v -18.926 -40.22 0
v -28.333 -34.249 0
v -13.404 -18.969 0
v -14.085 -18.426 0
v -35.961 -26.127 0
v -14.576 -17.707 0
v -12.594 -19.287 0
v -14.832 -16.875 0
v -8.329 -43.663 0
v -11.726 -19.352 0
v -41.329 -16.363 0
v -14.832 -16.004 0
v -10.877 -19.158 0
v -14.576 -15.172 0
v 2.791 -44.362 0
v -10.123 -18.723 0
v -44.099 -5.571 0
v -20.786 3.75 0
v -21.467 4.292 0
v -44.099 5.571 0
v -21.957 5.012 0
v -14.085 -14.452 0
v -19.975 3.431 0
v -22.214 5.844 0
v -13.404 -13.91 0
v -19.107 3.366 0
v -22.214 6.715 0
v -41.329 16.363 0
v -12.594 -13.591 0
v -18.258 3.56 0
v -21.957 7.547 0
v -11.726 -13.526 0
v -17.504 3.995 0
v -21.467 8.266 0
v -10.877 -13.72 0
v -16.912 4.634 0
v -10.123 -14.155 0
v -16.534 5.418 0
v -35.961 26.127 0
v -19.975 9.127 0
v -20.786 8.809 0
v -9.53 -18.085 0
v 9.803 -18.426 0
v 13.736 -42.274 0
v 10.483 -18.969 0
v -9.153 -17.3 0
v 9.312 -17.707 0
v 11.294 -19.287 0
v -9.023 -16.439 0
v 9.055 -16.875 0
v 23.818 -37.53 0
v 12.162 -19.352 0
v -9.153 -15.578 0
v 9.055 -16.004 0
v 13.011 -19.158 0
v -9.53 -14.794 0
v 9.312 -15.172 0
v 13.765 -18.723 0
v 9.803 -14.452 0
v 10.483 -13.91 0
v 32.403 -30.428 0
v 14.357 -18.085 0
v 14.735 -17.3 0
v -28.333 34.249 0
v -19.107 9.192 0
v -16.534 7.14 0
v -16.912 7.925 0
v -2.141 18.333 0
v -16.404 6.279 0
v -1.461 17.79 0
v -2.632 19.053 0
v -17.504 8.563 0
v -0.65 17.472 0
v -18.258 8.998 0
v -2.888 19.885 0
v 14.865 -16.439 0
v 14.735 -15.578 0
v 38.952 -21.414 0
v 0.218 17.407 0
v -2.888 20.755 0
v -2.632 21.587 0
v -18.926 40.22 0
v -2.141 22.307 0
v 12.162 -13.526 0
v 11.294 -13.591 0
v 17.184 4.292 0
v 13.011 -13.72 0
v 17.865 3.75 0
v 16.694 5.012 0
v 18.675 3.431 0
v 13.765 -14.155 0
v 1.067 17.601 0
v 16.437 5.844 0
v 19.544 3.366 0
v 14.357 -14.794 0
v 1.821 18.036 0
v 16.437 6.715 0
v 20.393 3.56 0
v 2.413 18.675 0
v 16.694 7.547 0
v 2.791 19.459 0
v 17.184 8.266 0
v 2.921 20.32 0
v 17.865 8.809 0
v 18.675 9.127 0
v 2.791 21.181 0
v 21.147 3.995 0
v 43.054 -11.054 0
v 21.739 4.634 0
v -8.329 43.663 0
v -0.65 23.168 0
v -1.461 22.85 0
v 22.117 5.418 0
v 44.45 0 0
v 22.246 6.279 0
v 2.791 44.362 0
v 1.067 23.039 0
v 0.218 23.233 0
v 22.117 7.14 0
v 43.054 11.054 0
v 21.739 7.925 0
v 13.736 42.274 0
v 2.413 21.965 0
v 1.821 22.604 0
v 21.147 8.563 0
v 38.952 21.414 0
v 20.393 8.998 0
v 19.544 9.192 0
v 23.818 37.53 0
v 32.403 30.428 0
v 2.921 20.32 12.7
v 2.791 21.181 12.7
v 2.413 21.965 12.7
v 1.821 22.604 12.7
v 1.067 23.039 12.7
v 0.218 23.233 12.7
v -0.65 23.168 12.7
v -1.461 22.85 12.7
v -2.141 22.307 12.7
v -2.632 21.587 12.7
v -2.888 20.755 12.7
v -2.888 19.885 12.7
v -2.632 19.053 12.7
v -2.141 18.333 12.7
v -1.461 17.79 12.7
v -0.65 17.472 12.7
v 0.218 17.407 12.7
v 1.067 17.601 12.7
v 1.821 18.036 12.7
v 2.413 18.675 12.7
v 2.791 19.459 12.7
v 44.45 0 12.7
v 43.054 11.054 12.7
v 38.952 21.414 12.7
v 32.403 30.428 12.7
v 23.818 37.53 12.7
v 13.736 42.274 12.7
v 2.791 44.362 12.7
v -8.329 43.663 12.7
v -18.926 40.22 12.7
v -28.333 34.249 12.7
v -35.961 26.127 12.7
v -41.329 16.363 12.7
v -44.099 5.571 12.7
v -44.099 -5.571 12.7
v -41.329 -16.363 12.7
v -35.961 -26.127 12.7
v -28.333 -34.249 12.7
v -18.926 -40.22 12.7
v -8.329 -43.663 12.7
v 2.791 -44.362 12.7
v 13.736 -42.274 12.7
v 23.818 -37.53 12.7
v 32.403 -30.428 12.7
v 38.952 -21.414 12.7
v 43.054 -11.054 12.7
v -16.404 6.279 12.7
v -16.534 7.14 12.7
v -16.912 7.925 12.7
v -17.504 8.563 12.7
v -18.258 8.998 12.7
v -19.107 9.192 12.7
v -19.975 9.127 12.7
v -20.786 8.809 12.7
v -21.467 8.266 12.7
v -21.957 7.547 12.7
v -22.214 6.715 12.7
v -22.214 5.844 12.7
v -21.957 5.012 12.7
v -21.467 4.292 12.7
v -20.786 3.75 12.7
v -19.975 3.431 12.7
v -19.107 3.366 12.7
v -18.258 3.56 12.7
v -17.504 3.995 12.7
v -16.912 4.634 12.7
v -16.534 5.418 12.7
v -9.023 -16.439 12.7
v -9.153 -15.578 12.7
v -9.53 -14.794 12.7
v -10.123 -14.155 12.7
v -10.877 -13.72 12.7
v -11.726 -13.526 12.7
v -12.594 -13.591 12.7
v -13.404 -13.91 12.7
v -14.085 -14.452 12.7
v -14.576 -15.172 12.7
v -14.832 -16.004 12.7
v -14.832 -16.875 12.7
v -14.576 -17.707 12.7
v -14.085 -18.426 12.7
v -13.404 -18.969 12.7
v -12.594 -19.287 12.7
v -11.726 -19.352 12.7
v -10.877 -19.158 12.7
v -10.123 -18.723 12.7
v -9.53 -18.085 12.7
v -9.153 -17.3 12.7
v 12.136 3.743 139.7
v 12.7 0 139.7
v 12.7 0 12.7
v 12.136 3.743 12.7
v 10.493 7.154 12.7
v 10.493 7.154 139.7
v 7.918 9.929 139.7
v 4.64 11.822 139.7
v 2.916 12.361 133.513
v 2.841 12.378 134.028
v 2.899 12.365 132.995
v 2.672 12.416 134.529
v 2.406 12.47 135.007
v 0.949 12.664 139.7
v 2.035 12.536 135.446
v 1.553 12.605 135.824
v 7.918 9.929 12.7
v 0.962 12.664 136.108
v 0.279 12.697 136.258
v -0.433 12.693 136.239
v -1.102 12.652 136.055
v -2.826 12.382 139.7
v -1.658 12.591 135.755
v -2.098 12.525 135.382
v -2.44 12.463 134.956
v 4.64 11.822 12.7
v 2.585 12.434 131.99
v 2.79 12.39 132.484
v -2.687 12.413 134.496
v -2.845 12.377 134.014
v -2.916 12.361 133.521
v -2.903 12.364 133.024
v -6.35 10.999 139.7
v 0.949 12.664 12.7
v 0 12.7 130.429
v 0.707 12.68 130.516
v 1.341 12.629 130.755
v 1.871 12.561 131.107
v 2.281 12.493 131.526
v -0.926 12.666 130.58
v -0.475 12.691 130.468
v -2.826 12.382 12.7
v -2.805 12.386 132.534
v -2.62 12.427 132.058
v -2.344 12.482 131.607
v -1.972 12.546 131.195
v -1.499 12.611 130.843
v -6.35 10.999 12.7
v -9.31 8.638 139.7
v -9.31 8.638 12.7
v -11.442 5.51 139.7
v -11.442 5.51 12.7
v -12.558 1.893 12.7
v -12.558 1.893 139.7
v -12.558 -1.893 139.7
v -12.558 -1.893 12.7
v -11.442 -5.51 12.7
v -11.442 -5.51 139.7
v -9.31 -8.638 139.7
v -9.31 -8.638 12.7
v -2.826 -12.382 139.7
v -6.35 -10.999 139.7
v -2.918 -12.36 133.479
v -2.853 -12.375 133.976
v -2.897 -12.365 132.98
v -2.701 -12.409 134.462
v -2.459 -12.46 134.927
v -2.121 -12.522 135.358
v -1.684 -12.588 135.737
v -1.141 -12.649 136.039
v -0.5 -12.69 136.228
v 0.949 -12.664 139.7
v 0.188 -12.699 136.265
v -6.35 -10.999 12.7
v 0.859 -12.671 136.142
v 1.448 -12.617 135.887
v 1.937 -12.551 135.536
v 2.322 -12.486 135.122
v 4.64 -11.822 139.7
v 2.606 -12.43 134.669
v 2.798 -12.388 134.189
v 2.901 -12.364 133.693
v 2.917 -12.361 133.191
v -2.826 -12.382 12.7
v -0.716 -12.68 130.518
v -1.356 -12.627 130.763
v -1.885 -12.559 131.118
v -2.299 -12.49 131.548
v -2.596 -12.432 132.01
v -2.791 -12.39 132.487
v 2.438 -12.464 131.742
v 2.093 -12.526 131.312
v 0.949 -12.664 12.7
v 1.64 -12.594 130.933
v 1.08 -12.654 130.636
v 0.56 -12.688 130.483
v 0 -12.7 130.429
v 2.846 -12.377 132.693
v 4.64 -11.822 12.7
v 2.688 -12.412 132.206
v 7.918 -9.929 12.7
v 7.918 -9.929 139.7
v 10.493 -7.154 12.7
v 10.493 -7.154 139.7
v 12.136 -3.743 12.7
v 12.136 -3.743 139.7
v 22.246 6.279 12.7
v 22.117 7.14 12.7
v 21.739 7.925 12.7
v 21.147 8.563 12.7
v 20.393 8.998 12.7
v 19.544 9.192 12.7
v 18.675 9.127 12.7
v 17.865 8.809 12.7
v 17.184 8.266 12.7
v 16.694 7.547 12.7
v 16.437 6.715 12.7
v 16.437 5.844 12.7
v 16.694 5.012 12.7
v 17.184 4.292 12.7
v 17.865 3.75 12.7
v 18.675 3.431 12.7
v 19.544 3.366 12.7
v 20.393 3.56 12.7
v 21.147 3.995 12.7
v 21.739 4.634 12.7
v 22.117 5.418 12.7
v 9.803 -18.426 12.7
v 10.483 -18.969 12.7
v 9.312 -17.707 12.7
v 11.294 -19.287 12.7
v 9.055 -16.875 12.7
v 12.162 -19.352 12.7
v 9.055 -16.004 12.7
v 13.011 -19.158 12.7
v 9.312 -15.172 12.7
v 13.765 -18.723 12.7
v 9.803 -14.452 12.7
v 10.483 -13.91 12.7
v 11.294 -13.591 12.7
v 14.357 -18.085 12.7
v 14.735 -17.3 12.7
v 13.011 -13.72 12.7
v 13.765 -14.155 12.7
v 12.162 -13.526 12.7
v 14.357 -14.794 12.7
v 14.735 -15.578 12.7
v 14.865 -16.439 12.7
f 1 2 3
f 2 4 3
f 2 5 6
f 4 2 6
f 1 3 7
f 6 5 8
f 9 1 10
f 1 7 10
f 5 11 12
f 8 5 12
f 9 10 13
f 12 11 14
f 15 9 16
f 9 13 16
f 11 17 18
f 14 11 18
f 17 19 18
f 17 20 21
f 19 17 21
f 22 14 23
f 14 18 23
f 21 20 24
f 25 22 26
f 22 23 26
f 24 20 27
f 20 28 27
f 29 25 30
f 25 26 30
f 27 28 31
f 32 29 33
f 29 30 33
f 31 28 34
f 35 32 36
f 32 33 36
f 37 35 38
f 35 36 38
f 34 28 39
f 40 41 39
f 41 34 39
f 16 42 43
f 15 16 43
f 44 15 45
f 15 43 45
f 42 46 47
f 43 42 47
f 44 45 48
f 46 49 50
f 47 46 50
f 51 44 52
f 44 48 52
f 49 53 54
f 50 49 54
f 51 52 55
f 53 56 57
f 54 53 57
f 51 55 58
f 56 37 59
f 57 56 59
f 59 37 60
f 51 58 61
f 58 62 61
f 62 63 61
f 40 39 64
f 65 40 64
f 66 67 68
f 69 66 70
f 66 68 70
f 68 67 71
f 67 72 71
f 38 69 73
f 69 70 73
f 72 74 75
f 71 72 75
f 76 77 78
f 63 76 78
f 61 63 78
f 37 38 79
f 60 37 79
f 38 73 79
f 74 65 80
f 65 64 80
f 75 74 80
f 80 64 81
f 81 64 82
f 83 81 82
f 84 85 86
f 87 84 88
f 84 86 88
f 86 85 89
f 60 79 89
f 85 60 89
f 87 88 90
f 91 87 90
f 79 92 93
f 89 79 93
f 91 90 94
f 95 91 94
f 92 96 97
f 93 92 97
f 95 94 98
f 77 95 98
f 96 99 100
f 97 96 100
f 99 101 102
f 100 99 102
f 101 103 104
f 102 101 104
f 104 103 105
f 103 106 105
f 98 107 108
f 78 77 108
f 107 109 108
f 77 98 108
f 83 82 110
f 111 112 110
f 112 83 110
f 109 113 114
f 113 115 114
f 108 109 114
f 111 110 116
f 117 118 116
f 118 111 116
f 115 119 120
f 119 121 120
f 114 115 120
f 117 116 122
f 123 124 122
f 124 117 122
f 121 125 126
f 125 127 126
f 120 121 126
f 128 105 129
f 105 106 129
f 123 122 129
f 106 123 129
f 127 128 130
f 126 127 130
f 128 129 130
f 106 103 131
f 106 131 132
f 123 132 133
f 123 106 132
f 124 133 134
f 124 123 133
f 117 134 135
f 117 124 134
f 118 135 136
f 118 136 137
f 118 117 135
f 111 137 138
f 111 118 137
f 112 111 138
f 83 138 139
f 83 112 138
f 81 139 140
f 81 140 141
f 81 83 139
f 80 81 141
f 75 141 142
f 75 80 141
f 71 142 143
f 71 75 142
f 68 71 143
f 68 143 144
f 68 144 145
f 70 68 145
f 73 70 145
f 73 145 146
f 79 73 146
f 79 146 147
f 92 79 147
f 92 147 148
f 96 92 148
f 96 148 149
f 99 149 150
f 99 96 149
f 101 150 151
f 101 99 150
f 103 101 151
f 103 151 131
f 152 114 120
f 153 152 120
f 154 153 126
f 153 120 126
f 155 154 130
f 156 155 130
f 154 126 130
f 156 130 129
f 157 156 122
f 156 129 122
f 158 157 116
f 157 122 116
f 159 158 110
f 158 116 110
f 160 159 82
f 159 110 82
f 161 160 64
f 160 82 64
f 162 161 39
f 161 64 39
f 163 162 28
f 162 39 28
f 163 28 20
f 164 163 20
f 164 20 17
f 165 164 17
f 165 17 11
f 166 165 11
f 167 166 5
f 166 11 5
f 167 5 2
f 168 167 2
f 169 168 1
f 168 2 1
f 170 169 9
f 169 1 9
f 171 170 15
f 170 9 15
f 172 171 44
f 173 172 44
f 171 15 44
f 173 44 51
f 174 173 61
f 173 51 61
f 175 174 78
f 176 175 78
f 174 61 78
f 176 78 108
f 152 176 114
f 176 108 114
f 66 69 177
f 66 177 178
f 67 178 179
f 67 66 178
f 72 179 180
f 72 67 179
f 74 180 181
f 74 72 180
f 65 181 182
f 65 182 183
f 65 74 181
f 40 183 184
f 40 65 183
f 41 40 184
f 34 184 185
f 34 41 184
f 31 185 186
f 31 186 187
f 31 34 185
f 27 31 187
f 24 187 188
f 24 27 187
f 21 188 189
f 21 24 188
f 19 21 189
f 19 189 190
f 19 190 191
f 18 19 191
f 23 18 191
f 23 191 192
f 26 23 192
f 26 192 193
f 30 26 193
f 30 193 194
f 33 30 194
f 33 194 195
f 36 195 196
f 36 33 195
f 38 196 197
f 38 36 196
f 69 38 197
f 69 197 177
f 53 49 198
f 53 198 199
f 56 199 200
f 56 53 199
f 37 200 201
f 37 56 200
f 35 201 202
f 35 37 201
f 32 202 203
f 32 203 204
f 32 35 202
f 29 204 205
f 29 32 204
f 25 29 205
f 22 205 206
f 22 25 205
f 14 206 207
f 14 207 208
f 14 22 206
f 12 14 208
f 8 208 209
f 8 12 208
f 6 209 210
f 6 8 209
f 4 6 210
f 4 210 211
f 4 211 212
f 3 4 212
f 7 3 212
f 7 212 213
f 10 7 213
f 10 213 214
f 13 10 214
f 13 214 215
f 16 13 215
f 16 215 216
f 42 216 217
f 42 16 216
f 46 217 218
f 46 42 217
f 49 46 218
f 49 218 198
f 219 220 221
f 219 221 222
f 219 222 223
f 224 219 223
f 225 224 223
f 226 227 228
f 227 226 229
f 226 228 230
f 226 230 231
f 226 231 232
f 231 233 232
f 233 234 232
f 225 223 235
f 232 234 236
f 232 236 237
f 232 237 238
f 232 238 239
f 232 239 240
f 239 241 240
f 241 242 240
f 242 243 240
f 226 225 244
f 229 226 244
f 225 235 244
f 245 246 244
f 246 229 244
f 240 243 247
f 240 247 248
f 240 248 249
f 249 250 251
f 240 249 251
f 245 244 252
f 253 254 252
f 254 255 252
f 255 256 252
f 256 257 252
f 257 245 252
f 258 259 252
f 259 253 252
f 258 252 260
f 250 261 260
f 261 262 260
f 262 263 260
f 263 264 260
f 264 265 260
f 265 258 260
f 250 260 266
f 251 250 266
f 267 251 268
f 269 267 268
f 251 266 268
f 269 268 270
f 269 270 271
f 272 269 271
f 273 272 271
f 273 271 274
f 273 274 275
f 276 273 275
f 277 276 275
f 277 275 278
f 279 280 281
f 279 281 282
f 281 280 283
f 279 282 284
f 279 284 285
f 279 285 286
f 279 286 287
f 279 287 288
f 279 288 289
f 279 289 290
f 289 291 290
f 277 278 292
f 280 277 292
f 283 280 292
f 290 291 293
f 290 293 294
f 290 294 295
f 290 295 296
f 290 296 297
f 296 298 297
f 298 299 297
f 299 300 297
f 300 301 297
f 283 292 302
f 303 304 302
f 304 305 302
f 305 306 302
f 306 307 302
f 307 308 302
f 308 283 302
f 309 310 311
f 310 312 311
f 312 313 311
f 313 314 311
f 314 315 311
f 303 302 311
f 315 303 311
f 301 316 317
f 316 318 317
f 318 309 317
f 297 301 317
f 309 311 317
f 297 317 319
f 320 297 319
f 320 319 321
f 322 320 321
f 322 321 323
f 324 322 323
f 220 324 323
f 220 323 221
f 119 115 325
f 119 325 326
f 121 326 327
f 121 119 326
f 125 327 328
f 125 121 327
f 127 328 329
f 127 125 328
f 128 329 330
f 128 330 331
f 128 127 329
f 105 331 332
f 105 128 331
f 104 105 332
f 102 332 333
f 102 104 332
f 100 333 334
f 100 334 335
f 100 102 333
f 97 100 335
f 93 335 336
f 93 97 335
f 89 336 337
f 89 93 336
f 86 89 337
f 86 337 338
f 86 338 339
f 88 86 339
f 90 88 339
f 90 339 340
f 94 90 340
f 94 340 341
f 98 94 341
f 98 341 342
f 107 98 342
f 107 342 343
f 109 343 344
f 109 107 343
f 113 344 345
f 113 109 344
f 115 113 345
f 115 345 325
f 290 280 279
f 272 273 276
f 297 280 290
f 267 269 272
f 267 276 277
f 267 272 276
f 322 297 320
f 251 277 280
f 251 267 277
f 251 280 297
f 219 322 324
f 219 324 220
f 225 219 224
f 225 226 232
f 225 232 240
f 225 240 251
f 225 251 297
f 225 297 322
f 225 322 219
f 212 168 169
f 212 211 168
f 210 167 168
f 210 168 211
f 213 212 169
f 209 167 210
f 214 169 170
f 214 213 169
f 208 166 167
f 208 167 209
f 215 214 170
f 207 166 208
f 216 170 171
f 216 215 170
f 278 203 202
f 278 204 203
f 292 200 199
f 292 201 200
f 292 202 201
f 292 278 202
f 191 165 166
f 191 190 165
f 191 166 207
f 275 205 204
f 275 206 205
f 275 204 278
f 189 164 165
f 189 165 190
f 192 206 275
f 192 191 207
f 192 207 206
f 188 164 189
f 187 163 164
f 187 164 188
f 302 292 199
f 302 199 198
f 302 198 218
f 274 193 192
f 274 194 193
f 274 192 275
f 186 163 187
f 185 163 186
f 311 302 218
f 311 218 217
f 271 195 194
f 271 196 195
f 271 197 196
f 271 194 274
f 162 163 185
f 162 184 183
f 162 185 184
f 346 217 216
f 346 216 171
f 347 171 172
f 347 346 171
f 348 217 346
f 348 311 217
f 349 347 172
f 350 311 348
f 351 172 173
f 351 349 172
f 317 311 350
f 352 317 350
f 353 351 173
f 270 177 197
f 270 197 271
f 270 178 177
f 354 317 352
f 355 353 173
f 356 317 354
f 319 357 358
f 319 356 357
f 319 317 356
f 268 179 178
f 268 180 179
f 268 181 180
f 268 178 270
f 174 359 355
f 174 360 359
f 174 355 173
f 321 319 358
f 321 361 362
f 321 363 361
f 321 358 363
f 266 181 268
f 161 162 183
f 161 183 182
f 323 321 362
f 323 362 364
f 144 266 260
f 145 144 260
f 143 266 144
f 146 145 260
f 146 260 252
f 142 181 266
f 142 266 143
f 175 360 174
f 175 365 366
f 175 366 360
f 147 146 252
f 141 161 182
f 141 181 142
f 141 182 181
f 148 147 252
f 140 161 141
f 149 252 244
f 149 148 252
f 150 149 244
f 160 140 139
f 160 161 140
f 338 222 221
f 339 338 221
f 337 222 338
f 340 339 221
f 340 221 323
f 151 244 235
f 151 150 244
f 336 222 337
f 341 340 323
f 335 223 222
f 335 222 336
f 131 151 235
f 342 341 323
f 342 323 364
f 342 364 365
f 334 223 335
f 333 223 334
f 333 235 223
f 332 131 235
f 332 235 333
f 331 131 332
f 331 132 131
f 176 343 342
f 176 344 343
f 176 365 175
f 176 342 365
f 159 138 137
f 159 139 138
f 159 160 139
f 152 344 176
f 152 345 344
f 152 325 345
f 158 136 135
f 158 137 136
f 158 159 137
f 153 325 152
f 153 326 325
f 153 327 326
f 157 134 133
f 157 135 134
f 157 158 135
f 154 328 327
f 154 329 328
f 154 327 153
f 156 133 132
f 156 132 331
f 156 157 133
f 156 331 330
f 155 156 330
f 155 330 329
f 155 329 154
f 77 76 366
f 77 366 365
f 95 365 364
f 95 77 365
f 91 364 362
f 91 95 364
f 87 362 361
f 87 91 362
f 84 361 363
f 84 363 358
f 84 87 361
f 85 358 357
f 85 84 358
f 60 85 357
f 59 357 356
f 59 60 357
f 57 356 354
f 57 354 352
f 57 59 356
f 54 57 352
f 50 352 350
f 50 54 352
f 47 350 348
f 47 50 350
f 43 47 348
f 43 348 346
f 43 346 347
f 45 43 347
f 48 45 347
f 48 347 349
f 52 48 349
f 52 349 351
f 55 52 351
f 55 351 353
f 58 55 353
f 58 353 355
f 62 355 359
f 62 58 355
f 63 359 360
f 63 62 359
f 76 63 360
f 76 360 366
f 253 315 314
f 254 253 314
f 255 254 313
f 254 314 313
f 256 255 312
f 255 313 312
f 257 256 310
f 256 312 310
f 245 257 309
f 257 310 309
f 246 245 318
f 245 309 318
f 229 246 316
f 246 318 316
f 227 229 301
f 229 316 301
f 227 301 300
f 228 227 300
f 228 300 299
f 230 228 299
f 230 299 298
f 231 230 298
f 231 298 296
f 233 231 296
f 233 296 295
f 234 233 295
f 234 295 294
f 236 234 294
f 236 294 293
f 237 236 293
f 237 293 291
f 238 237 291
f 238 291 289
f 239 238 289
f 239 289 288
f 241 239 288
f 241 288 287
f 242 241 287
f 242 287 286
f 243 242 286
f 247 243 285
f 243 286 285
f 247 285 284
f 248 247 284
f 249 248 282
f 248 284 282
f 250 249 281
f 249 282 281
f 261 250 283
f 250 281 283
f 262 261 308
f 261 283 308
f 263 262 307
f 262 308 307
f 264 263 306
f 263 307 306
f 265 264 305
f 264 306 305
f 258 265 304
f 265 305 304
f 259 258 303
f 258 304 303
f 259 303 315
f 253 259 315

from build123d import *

# Parameters (mm, degrees)
SKETCH1_R           = 44.45
SKETCH1_R_2         = 2.921
BOSS_EXTRUDE1_DEPTH = 12.7
SKETCH2_R           = 12.7
BOSS_EXTRUDE2_DEPTH = 127
CUT_EXTRUDE1_REACH  = 159.347
SKETCH4_R           = 2.921


with BuildPart() as part:
    # Sketch1 → Boss-Extrude1 (new body)
    with BuildSketch(Plane.XY):
        Circle(SKETCH1_R)
        with Locations((0, 20.32)):
            Circle(SKETCH1_R_2, mode=Mode.SUBTRACT)
        with Locations((19.325468411, 6.279225326)):
            Circle(SKETCH1_R_2, mode=Mode.SUBTRACT)
        with Locations((11.943796327, -16.439225326)):
            Circle(SKETCH1_R_2, mode=Mode.SUBTRACT)
        with Locations((-11.943796327, -16.439225326)):
            Circle(SKETCH1_R_2, mode=Mode.SUBTRACT)
        with Locations((-19.325468411, 6.279225326)):
            Circle(SKETCH1_R_2, mode=Mode.SUBTRACT)
    extrude(amount=BOSS_EXTRUDE1_DEPTH)

    # Sketch2 → Boss-Extrude2 (add)
    with BuildSketch(Plane.XY.offset(12.7)):
        Circle(SKETCH2_R)
    extrude(amount=BOSS_EXTRUDE2_DEPTH)

    # Sketch4 → Cut-Extrude1 (cut, up to next)
    with BuildSketch(Plane(origin=(0, -12.7, 0), x_dir=(-1, 0, 0), z_dir=(0, -1, 0)), mode=Mode.PRIVATE) as cut_extrude1_sk1:
        with Locations(Location((0, -133.35, 0), (0, 0, 90))):
            Circle(SKETCH4_R)
    cut_extrude1_tool1 = extrude(cut_extrude1_sk1.sketch, amount=-CUT_EXTRUDE1_REACH, mode=Mode.PRIVATE) & part.part
    add(cut_extrude1_tool1.solids().sort_by_distance((0, -12.7, 133.35))[0], mode=Mode.SUBTRACT)


solid = part.part
